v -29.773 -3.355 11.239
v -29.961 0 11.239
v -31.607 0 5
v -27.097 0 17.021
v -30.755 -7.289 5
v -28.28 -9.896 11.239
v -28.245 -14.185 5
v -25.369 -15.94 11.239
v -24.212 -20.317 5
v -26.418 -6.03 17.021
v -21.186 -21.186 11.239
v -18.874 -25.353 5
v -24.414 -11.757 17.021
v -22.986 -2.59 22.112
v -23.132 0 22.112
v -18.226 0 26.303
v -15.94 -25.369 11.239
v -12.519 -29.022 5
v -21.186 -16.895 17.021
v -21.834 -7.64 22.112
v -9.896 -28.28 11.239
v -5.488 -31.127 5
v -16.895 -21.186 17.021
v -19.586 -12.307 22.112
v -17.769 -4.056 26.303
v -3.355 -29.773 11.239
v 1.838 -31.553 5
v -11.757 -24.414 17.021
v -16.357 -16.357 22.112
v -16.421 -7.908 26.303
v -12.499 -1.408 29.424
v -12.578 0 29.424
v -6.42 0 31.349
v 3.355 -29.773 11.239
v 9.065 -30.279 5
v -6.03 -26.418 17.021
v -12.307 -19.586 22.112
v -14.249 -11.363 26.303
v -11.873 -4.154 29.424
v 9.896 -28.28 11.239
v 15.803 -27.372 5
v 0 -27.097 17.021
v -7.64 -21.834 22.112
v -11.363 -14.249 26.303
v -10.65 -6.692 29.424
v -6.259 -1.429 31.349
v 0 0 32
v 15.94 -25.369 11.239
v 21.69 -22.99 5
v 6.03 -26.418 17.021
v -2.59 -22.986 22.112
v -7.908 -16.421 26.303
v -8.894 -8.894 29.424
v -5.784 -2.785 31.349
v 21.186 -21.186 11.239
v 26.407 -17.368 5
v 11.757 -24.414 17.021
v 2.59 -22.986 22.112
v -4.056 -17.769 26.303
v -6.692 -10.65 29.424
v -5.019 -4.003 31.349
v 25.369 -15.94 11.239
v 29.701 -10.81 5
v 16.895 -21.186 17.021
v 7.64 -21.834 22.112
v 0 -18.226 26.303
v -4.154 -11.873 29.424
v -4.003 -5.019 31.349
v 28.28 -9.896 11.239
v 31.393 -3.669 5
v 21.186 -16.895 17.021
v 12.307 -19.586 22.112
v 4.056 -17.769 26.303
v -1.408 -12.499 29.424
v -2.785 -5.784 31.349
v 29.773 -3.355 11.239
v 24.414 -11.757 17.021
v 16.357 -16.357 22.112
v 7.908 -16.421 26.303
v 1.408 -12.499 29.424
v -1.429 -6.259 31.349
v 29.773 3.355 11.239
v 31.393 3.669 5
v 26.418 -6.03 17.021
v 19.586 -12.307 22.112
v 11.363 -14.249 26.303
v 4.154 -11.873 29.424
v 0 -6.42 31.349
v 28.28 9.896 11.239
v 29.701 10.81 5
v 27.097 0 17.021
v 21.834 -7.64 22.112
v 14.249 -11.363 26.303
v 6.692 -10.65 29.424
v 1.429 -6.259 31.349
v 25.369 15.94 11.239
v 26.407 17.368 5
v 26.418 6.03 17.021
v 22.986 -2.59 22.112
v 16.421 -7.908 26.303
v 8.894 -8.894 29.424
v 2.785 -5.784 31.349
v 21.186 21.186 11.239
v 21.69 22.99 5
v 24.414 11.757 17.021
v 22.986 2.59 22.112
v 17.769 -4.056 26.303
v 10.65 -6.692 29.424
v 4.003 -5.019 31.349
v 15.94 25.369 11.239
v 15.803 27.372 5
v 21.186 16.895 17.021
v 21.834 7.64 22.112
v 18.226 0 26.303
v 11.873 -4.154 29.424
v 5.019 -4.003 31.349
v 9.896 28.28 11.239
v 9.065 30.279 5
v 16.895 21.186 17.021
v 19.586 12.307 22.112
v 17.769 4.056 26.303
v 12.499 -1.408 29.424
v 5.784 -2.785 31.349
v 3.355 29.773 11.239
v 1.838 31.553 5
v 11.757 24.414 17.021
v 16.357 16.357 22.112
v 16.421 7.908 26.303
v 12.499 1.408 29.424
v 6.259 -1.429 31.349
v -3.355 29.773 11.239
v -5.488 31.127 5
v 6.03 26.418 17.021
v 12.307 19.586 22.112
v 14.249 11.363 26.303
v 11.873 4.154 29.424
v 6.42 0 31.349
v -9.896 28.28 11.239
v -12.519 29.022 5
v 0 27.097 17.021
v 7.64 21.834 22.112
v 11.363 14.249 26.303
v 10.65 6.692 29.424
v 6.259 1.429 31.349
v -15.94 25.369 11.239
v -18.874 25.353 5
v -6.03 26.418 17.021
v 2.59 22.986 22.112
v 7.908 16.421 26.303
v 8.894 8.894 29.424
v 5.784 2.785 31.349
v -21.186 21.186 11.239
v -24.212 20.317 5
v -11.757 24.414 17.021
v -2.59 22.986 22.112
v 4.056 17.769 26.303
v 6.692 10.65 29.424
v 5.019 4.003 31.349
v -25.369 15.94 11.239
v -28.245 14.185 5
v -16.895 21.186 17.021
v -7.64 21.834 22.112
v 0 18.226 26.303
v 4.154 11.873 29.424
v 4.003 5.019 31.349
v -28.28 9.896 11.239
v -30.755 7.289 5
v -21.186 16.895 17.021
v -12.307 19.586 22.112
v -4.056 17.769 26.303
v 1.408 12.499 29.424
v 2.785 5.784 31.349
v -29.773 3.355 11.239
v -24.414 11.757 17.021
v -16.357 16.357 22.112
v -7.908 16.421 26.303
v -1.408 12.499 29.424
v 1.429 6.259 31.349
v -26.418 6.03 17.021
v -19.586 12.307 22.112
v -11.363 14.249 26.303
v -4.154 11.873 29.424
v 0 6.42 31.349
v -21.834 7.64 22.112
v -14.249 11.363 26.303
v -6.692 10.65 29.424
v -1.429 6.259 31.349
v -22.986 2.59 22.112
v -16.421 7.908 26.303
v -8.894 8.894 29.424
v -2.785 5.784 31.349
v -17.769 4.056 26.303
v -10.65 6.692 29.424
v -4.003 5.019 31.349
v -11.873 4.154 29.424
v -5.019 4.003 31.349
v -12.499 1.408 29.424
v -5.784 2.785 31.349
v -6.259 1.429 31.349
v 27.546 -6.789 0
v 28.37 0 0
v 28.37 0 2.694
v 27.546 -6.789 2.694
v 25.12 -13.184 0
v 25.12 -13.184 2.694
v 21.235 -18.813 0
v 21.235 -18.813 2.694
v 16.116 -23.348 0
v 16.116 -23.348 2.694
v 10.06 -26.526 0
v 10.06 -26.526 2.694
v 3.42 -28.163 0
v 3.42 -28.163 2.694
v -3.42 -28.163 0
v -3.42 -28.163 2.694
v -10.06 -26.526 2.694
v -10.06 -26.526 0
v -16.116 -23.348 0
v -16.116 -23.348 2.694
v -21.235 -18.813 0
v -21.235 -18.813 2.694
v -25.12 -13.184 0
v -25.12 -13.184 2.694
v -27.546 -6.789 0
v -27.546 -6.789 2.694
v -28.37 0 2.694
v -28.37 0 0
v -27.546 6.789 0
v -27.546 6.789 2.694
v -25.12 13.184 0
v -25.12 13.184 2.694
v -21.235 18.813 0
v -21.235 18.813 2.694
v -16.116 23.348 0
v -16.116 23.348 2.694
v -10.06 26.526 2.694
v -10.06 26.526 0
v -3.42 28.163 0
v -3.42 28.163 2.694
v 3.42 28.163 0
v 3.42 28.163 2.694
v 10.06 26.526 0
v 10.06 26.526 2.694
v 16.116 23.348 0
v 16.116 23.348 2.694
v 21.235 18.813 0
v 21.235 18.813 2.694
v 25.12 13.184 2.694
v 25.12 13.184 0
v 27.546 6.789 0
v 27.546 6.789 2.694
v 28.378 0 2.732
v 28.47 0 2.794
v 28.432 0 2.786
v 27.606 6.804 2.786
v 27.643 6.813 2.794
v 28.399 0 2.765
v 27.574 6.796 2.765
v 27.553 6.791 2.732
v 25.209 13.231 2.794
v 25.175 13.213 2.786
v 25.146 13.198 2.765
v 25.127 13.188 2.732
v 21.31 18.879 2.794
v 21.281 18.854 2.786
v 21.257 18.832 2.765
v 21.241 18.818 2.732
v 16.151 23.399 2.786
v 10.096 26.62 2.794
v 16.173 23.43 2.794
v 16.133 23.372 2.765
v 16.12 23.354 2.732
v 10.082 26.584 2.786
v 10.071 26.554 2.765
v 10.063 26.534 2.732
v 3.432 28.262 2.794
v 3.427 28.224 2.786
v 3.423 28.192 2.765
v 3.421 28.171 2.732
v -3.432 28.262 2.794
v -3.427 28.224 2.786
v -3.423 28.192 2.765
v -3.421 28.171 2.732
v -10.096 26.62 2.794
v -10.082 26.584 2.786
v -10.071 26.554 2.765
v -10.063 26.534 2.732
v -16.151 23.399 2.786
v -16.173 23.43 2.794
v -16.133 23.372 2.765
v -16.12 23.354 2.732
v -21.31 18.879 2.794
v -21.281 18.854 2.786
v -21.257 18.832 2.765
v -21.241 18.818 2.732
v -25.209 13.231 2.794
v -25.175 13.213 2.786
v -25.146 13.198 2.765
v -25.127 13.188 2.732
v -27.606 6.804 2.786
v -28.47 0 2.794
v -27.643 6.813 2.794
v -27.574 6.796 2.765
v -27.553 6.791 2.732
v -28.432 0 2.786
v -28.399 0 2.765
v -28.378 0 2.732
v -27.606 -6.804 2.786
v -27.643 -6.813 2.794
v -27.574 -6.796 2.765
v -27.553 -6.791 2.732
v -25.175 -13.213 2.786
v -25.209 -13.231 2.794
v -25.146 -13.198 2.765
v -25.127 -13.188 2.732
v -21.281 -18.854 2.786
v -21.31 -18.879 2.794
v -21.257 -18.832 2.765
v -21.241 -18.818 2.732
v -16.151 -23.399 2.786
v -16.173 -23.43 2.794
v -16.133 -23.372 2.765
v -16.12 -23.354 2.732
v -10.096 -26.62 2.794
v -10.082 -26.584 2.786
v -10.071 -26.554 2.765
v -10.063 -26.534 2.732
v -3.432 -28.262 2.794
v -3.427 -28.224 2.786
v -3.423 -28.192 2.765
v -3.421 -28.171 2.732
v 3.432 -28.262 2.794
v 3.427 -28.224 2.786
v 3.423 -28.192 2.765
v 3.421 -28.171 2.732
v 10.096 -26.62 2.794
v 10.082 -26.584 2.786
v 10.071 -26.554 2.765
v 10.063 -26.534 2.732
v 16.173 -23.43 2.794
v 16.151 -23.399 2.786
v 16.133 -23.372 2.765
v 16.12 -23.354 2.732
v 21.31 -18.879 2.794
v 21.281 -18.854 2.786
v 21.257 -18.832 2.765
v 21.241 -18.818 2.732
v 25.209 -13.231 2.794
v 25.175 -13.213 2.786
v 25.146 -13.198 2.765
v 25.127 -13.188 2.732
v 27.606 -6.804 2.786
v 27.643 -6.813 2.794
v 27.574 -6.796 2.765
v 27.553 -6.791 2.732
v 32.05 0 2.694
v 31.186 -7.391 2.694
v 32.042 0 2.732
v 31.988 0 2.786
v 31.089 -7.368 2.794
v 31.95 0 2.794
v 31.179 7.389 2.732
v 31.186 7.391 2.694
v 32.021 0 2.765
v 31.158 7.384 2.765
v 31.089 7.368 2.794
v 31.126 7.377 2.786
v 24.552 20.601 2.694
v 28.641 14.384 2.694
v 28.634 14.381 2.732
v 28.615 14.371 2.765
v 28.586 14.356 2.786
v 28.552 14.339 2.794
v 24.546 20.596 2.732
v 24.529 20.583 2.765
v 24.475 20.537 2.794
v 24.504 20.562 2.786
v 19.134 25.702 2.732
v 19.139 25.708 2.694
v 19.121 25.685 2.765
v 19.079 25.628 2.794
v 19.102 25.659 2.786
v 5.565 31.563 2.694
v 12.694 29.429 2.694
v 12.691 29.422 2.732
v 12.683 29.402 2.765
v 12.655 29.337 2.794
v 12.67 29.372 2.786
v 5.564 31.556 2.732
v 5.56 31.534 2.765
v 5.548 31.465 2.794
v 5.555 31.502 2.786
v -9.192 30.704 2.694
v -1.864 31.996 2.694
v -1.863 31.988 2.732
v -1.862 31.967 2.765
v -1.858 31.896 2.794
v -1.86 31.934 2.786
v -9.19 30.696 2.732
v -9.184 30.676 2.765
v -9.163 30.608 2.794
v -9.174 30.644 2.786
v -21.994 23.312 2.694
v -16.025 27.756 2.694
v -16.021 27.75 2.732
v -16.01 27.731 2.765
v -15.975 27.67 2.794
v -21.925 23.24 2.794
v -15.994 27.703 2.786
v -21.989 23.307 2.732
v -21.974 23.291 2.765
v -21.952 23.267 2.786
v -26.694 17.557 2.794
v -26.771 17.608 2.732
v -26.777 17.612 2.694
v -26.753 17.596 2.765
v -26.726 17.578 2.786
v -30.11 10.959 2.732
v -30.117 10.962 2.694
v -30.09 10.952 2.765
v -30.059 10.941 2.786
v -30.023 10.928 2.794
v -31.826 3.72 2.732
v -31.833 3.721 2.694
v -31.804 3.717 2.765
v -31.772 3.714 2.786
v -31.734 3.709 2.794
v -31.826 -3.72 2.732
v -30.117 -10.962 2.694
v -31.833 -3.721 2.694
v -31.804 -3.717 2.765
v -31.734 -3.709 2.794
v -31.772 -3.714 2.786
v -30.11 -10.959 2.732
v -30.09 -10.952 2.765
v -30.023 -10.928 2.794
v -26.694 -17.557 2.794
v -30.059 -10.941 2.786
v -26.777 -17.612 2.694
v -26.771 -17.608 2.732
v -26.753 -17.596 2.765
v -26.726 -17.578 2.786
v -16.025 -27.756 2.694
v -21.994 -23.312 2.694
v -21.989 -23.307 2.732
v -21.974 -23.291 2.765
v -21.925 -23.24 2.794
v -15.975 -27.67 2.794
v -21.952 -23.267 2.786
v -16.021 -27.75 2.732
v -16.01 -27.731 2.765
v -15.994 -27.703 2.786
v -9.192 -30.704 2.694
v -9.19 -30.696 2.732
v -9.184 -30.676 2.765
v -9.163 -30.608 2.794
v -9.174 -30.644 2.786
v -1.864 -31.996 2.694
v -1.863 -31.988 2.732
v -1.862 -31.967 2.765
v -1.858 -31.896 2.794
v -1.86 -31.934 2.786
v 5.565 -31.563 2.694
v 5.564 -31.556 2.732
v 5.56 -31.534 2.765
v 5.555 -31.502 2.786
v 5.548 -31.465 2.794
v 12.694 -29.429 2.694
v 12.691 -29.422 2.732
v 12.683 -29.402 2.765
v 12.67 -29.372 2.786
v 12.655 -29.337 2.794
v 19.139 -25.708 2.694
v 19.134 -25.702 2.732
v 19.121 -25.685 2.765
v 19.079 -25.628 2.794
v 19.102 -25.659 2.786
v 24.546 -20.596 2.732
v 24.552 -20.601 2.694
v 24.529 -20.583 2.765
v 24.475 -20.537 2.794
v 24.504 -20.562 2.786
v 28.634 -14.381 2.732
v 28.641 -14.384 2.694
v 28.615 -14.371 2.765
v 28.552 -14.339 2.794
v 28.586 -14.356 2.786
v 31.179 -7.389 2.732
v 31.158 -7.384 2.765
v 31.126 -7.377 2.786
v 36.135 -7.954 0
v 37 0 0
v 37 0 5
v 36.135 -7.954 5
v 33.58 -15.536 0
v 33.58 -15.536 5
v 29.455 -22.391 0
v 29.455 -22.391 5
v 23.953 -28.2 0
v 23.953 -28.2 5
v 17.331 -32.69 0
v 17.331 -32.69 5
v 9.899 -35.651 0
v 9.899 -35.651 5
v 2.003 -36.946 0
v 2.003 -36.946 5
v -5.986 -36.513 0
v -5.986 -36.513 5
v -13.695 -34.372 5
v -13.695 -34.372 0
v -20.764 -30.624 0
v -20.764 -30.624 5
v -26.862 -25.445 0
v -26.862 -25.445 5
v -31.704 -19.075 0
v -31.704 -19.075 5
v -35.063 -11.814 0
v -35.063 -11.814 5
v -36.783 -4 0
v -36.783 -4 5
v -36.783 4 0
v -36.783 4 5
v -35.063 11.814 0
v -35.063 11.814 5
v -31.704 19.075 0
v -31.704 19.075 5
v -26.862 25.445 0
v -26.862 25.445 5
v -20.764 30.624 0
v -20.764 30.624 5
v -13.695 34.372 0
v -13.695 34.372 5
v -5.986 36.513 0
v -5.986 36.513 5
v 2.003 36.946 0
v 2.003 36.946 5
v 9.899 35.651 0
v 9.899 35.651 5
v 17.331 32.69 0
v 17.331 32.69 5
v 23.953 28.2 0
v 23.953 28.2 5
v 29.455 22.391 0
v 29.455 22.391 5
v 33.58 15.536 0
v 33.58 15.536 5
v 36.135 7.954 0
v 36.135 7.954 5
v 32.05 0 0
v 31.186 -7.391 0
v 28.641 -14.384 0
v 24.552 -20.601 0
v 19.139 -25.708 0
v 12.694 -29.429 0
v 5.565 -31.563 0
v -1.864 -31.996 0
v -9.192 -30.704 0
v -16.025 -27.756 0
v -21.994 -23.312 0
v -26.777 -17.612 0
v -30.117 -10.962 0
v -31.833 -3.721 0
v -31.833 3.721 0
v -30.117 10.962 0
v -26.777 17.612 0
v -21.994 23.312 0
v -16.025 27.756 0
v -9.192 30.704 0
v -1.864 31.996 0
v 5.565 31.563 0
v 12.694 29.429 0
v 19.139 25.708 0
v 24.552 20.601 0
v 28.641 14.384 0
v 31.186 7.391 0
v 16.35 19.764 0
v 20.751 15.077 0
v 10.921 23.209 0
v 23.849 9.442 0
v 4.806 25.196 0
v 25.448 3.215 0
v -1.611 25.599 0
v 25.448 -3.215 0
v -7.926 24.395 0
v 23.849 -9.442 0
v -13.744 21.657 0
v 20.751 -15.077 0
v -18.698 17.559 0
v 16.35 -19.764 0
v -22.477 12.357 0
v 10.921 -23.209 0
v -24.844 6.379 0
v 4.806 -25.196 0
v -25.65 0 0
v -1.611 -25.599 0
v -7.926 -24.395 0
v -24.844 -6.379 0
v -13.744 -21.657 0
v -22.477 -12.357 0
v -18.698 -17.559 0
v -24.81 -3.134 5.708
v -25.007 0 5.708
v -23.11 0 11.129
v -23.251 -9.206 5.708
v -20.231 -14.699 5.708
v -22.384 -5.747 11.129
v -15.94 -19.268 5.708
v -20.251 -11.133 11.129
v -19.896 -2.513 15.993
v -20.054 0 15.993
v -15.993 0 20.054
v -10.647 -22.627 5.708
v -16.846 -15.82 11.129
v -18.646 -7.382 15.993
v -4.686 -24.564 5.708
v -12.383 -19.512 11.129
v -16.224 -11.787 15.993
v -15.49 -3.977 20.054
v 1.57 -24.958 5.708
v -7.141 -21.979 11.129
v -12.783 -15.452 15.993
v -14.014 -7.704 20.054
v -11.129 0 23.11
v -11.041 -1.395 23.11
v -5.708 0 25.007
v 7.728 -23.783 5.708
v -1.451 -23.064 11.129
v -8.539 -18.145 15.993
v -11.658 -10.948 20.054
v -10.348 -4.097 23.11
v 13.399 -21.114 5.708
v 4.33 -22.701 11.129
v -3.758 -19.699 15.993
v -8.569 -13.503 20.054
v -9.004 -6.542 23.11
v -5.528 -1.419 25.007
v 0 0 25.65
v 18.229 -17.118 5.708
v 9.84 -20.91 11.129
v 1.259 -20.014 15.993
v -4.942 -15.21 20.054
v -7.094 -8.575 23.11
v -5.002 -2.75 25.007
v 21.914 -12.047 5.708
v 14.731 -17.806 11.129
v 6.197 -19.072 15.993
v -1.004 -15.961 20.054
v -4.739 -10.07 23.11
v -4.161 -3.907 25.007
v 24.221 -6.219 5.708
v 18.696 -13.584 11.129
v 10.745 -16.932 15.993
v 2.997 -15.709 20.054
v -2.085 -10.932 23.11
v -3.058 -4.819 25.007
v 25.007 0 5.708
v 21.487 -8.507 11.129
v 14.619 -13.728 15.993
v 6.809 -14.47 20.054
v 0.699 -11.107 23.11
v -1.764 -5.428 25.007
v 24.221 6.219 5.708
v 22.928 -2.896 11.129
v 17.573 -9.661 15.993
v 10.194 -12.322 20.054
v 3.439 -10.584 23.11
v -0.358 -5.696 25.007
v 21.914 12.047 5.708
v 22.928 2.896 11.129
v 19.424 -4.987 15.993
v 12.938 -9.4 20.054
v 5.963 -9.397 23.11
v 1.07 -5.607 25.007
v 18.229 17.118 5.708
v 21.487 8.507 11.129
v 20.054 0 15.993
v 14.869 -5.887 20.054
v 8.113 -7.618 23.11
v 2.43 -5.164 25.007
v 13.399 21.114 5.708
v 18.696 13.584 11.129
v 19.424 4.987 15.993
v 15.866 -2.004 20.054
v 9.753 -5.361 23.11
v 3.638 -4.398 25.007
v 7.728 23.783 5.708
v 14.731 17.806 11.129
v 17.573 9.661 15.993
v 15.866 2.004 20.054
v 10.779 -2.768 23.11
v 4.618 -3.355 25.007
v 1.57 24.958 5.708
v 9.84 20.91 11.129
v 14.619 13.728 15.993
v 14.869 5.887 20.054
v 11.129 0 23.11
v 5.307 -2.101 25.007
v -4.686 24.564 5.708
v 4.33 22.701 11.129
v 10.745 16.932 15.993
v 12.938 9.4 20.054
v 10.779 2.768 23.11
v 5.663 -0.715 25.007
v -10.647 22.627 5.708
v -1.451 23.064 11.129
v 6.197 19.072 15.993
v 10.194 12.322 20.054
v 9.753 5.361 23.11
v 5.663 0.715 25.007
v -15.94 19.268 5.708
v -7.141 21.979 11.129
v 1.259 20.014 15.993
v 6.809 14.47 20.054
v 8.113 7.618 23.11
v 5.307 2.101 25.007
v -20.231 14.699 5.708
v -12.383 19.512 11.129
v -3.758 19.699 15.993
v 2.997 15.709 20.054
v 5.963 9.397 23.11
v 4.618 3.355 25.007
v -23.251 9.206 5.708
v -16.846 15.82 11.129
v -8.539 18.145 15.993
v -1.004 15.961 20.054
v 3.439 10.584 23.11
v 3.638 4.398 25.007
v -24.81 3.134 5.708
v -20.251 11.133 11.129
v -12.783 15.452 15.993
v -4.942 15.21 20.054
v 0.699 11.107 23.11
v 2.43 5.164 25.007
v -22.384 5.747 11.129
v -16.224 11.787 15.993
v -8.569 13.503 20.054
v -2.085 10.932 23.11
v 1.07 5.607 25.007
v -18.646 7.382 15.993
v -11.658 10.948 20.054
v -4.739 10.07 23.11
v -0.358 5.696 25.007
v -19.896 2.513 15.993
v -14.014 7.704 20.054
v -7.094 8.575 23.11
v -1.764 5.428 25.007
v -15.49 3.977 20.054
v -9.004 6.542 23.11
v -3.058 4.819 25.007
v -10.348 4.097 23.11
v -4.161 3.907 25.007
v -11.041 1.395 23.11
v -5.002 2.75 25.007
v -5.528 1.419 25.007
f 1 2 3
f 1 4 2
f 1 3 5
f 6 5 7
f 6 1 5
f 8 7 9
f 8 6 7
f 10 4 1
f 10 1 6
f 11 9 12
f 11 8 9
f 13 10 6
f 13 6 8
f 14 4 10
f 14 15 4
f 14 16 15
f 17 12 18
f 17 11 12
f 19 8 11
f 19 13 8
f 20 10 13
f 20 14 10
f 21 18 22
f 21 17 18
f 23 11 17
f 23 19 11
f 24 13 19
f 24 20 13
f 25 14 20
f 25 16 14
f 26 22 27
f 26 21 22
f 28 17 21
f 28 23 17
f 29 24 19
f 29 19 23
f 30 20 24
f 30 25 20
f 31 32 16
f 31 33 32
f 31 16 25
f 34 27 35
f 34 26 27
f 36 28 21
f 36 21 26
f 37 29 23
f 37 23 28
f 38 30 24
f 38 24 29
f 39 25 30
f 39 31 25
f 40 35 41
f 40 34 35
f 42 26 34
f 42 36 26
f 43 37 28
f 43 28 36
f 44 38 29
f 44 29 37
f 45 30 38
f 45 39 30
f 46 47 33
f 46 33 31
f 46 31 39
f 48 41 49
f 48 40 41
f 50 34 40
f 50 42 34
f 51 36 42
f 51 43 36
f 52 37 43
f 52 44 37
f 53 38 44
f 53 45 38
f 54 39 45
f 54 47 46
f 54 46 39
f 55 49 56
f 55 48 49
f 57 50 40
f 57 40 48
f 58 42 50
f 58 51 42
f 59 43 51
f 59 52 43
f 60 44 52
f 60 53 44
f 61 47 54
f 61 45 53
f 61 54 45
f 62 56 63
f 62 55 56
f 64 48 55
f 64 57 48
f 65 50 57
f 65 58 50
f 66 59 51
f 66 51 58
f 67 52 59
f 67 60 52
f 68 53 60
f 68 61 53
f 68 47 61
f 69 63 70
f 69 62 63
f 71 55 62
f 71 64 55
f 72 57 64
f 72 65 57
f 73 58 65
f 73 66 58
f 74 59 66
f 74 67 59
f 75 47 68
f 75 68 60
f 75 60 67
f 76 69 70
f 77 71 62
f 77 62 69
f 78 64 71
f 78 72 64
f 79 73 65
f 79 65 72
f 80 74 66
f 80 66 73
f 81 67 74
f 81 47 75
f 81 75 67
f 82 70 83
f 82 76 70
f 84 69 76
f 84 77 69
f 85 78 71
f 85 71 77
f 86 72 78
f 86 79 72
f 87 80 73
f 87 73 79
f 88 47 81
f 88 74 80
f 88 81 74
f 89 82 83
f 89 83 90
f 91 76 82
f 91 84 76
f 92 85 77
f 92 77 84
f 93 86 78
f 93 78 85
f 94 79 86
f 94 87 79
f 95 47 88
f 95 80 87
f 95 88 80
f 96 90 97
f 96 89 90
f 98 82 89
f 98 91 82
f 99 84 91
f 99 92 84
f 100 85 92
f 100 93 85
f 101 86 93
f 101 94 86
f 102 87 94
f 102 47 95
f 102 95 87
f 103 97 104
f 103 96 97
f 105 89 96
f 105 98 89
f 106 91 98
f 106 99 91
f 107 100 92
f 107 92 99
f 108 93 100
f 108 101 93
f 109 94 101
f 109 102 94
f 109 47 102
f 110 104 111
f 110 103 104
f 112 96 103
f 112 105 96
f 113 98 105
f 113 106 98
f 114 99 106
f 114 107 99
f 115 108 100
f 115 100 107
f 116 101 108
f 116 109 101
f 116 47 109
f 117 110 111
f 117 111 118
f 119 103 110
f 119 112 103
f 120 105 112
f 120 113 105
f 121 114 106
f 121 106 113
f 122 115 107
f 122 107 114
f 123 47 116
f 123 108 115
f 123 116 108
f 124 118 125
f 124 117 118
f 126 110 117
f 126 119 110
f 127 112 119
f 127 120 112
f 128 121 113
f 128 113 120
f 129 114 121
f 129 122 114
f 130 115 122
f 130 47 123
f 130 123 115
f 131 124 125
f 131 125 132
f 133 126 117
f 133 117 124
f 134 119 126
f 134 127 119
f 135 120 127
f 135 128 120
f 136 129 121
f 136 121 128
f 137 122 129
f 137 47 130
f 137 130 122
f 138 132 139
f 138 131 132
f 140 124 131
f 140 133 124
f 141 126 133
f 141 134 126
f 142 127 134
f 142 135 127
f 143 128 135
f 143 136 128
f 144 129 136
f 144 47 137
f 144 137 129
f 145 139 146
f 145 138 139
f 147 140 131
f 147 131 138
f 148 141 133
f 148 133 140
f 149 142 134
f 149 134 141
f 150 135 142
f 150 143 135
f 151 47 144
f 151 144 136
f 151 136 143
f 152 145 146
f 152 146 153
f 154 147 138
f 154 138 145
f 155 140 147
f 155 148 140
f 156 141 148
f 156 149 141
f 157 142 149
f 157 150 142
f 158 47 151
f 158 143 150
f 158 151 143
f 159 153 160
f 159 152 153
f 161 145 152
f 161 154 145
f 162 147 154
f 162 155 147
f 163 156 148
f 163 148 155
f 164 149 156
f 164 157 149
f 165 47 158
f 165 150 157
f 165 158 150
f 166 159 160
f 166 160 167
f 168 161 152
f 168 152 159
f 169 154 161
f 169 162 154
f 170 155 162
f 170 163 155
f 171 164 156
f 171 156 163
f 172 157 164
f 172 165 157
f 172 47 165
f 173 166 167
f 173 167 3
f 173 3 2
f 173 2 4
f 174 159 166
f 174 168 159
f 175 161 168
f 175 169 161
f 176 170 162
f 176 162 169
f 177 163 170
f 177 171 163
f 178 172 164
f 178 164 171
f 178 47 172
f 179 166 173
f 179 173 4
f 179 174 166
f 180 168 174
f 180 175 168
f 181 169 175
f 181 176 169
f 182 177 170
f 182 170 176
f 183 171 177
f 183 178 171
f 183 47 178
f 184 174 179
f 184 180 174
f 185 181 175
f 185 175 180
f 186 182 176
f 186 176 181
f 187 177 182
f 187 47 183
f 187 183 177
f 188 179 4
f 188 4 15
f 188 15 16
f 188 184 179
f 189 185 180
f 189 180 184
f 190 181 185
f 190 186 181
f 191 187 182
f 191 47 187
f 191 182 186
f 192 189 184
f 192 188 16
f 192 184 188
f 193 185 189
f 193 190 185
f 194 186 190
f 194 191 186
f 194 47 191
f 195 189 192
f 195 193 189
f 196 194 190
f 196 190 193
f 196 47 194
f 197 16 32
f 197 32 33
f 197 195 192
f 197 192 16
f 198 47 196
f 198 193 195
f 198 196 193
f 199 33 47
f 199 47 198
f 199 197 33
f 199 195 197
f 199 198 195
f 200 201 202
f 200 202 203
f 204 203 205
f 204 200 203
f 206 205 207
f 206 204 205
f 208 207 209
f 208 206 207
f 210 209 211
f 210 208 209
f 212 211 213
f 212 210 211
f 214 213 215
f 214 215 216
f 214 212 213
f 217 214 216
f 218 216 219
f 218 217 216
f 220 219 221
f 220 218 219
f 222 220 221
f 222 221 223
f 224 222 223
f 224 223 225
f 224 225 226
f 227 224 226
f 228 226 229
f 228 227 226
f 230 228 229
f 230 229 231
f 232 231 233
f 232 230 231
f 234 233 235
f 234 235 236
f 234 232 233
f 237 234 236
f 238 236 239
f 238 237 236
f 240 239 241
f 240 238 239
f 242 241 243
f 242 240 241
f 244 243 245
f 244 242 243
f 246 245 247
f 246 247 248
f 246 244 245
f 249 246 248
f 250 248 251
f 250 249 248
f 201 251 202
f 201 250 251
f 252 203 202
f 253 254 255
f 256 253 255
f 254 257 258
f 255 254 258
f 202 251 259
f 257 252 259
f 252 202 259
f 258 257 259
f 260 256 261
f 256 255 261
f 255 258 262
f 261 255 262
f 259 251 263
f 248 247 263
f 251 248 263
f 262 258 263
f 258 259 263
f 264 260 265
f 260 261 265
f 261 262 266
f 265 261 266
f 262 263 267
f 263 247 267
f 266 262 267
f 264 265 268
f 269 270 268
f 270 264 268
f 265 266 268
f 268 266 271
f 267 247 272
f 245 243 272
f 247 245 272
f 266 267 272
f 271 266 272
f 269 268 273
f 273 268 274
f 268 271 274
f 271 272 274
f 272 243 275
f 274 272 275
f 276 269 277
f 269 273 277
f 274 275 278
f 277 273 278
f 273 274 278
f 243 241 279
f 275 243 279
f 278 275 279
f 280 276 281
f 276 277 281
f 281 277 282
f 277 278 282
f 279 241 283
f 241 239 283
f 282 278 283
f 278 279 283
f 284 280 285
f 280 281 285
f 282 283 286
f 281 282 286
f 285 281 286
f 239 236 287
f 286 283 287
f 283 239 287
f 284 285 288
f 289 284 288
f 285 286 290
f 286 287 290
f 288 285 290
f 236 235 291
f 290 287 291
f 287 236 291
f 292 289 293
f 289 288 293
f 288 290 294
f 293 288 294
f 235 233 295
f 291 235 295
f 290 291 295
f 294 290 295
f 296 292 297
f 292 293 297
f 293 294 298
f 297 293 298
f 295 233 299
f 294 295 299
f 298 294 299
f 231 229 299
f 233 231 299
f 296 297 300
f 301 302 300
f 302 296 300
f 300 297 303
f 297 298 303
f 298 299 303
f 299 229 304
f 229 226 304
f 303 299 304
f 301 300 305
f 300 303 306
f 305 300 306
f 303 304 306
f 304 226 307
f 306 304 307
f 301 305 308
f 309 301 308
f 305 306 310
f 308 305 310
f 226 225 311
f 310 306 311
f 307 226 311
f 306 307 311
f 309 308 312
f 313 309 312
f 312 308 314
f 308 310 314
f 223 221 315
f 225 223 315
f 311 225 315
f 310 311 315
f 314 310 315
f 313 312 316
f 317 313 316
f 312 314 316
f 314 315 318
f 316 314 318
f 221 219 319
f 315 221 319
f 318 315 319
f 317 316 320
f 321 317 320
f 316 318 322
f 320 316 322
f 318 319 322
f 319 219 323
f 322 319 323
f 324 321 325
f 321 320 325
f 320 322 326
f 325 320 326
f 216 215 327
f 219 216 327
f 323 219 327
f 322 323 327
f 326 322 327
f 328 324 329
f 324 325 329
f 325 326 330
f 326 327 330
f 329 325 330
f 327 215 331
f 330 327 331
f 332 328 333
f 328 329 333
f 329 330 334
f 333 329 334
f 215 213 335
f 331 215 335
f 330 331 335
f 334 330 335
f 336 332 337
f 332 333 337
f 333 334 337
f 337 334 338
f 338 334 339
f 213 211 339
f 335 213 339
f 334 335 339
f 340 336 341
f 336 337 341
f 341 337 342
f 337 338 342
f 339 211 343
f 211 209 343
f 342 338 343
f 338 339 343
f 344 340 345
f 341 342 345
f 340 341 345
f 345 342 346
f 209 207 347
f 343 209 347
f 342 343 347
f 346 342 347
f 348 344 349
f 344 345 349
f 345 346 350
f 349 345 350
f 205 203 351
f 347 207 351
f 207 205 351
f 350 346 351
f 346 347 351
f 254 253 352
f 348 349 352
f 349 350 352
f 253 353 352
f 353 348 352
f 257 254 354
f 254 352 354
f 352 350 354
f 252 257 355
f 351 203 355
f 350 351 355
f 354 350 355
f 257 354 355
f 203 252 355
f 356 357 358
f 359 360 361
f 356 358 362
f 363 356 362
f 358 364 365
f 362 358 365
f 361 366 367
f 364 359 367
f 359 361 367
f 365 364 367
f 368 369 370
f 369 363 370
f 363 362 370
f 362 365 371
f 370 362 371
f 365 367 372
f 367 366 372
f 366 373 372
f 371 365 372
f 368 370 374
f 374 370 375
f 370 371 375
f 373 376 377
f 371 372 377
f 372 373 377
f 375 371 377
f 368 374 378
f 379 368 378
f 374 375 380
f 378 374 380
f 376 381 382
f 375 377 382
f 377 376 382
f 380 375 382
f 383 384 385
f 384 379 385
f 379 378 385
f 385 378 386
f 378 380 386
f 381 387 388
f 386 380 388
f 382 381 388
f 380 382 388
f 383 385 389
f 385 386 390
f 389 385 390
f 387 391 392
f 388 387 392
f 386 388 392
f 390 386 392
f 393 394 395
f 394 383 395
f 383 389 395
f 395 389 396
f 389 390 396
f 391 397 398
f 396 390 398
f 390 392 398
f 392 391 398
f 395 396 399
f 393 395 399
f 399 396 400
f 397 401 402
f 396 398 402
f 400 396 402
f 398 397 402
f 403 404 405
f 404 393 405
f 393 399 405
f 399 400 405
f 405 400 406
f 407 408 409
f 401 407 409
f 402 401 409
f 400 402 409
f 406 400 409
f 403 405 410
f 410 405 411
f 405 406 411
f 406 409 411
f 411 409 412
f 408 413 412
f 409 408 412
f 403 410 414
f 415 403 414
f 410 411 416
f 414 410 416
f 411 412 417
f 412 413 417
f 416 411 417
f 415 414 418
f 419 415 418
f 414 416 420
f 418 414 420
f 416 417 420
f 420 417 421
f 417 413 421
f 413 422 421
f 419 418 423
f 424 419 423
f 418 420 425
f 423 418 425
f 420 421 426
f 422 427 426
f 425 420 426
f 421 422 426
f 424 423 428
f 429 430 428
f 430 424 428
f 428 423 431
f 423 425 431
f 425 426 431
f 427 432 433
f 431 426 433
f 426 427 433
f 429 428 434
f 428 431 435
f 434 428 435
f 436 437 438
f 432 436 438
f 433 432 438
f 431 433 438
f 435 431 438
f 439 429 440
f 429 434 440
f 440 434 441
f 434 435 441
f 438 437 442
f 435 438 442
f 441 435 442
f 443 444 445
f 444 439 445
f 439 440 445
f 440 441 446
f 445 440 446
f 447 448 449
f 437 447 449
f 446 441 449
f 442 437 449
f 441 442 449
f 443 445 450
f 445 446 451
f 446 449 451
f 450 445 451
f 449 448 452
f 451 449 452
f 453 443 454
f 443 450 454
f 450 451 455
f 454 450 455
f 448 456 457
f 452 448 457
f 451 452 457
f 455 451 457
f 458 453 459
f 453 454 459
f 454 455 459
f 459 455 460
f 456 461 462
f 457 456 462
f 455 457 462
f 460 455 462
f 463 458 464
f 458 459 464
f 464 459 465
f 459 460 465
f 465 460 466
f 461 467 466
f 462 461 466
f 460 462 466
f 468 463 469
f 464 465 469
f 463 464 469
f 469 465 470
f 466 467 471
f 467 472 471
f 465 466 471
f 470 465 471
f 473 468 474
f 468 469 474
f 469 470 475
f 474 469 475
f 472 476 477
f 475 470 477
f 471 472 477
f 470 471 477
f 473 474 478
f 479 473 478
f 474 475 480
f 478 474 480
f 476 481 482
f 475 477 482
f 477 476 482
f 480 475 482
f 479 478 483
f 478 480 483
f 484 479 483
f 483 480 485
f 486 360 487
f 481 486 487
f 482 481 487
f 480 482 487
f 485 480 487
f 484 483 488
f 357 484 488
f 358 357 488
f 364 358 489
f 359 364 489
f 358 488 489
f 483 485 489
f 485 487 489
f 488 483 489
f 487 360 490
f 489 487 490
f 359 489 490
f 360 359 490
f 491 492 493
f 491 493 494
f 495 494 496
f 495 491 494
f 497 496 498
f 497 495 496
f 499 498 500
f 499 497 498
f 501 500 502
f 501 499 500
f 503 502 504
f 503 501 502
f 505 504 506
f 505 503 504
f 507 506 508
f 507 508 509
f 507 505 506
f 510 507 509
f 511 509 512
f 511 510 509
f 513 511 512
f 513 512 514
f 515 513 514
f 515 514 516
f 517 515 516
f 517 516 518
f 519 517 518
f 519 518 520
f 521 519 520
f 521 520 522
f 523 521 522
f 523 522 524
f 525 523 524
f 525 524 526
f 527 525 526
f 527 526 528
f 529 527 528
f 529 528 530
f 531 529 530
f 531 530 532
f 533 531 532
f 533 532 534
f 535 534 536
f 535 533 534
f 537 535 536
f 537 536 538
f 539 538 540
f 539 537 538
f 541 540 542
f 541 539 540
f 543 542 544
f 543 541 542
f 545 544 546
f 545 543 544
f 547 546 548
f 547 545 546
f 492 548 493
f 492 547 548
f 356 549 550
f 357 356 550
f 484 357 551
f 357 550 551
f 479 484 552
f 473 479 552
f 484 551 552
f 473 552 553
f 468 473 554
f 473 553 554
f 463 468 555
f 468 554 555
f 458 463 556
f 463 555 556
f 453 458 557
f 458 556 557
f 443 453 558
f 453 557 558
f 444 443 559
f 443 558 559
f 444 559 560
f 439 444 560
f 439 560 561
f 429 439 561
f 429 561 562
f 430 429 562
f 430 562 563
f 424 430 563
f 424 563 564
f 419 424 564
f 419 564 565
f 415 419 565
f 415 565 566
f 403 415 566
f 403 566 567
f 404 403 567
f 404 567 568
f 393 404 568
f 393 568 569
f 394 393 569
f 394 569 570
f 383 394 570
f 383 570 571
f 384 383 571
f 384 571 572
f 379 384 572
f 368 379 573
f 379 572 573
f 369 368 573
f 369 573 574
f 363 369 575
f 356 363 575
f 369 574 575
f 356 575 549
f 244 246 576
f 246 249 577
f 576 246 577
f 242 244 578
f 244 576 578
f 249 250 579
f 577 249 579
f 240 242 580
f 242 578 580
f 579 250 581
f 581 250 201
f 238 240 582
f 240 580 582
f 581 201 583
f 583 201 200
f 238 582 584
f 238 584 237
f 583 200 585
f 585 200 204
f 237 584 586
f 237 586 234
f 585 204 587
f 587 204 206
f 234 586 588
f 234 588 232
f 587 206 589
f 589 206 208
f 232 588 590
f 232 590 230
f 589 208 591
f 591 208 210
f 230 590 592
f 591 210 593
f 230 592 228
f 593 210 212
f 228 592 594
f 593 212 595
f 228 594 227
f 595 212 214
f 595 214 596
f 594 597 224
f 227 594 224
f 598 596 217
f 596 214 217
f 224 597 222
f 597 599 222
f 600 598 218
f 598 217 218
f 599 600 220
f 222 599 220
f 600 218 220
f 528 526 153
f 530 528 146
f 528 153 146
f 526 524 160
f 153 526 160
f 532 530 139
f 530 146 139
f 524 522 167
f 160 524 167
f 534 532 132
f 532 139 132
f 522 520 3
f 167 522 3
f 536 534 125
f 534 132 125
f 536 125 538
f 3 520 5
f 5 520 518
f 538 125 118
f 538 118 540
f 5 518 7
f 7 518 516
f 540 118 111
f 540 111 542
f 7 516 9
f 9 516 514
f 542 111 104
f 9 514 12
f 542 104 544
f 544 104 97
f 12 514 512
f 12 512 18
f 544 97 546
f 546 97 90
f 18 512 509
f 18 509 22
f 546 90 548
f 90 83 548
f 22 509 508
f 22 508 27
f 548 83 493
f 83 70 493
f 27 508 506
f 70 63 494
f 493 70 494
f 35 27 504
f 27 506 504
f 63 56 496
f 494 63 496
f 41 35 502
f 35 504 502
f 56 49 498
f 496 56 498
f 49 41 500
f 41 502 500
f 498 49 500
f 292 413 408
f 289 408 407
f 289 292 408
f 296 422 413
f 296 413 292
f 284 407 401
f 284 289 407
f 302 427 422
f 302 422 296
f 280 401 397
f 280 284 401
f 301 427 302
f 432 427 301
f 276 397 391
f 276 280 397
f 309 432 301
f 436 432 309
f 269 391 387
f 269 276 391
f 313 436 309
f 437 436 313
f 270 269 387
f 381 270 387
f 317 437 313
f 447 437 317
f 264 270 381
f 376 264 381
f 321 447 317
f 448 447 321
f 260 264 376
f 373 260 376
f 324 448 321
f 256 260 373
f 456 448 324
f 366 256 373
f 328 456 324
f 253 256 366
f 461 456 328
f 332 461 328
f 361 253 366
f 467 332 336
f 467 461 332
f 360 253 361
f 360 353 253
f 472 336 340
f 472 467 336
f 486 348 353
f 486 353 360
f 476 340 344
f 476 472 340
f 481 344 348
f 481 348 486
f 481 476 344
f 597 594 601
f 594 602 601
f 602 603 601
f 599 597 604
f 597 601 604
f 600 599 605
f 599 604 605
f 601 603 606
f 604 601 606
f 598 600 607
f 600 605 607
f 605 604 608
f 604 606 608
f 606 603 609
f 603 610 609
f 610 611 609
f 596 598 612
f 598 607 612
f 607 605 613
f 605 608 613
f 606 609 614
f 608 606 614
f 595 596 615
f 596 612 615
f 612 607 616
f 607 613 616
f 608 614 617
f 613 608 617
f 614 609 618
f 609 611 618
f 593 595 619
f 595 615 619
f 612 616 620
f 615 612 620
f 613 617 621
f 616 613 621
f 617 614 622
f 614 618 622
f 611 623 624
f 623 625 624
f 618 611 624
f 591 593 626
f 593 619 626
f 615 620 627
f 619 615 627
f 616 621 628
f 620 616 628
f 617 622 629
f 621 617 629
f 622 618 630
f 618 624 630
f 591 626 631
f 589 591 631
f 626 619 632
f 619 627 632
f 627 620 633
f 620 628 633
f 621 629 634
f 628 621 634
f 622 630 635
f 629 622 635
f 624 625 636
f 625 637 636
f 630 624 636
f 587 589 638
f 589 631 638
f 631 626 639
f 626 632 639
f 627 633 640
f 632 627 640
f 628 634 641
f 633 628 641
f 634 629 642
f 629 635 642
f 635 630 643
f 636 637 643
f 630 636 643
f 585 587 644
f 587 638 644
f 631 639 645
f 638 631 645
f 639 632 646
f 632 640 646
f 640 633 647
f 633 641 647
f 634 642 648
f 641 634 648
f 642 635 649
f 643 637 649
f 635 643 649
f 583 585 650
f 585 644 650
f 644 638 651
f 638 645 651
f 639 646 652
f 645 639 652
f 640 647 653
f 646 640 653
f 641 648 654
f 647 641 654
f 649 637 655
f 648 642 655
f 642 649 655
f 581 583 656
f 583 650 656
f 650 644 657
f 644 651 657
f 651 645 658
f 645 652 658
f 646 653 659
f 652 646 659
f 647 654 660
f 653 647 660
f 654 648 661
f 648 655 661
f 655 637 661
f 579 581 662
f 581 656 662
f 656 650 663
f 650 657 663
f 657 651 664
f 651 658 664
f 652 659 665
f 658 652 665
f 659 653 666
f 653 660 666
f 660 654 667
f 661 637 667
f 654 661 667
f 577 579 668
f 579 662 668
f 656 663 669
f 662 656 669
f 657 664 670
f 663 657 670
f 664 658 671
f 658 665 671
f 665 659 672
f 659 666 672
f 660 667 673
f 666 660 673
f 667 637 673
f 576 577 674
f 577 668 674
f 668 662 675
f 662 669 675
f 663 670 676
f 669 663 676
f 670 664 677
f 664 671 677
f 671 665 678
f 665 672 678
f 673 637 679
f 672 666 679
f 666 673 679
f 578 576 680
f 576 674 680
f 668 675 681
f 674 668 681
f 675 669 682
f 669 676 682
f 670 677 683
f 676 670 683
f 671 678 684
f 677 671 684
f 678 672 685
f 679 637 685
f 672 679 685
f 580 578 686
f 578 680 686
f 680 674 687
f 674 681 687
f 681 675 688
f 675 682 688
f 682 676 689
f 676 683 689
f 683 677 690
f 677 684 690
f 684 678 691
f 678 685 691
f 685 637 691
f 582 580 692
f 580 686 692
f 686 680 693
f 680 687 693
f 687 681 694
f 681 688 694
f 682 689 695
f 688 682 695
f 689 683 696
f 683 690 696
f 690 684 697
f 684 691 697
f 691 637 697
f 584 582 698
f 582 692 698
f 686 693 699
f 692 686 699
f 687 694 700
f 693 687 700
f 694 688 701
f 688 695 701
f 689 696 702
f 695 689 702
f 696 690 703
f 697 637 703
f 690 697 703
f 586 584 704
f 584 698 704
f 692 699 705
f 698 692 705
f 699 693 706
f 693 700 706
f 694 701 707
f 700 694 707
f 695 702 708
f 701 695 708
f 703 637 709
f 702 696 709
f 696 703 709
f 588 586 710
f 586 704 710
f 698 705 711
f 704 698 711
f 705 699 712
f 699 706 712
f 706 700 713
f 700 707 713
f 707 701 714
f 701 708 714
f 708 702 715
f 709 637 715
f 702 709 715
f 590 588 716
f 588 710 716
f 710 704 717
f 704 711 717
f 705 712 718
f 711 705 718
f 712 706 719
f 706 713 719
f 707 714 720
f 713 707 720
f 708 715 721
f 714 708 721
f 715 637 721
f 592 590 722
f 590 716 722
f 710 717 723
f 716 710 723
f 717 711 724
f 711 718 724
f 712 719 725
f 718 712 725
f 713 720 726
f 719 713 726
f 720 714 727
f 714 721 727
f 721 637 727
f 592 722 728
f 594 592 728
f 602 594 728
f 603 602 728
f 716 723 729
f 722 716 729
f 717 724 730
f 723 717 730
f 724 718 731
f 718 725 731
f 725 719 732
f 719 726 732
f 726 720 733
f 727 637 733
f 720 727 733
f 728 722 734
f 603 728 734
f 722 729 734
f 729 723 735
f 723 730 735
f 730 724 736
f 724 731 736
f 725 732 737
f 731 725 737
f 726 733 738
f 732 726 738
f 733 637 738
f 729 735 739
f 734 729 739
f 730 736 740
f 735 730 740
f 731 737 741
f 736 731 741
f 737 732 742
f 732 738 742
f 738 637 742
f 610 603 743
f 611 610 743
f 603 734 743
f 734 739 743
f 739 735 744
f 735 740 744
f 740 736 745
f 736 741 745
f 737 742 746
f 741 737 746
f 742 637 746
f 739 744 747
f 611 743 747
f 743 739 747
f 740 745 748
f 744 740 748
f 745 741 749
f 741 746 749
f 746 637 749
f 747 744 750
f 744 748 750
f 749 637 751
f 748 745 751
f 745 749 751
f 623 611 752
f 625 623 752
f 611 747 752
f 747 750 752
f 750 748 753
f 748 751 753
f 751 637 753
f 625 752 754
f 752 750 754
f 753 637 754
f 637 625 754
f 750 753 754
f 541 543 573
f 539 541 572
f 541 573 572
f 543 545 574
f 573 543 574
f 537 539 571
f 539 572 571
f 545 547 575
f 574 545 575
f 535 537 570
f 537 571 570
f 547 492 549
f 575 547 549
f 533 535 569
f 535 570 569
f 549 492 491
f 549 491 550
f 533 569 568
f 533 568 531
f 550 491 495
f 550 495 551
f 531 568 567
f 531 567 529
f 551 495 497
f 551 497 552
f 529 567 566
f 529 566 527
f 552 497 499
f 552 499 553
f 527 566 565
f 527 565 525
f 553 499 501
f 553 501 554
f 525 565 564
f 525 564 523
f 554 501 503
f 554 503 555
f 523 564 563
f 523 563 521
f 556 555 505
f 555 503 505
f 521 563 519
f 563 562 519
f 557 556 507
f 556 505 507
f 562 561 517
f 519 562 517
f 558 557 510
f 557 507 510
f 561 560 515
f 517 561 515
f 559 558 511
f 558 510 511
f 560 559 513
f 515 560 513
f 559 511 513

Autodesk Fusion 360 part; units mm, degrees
sketch "Sketch1" plane through (0, 0, 0) normal (0, 1, 0) x (1, 0, 0)
  line L0 (-36, 0) -> (40, 0) construction
  arc A0 (-32, 0) -> (0, -32) centre (0, 0) ccw
  arc A1 (-25.65, 0) -> (0, -25.65) centre (0, 0) ccw
  line L1 (0, -32) -> (0, -25.65)
  line L2 (-25.65, 0) -> (-32, 0)
  dimension "d3" = 25.65
  dimension "d4" = 32
revolve "Revolve1" add sketch "Sketch1" angle 360 about axis through (0, 0, 1.75) along (0, 0, 1)
sketch "Sketch3" plane through (0, 0, 0) normal (0, 0, -1) x (1, 0, 0)
  circle A0 centre (0, 0) radius 32
  circle A1 centre (0, 0) radius 37
  circle A2 centre (0, 0) radius 25.65
  circle A3 centre (0, 0) radius 25.65
  dimension "d10" = 74
extrude "Extrude2" add sketch "Sketch3" against normal blind 5 contours A0 | A1
sketch "Sketch2" plane through (0, 0, 0) normal (0, 0, -1) x (1, 0, 0)
  circle A0 centre (0, 0) radius 28.37
  circle A1 centre (0, 0) radius 32.05
  circle A2 centre (0, 0) radius 37
  circle A3 centre (0, 0) radius 25.65
  dimension "d6" = 56.74
  dimension "d7" = 64.1
extrude "Extrude1" cut sketch "Sketch2" against normal blind 2.794 contours A1
fillet "Fillet1" radius 0.1 2 edges at (-26.4501, 10.259, 2.794) (-29.8811, -11.5898, 2.794)
